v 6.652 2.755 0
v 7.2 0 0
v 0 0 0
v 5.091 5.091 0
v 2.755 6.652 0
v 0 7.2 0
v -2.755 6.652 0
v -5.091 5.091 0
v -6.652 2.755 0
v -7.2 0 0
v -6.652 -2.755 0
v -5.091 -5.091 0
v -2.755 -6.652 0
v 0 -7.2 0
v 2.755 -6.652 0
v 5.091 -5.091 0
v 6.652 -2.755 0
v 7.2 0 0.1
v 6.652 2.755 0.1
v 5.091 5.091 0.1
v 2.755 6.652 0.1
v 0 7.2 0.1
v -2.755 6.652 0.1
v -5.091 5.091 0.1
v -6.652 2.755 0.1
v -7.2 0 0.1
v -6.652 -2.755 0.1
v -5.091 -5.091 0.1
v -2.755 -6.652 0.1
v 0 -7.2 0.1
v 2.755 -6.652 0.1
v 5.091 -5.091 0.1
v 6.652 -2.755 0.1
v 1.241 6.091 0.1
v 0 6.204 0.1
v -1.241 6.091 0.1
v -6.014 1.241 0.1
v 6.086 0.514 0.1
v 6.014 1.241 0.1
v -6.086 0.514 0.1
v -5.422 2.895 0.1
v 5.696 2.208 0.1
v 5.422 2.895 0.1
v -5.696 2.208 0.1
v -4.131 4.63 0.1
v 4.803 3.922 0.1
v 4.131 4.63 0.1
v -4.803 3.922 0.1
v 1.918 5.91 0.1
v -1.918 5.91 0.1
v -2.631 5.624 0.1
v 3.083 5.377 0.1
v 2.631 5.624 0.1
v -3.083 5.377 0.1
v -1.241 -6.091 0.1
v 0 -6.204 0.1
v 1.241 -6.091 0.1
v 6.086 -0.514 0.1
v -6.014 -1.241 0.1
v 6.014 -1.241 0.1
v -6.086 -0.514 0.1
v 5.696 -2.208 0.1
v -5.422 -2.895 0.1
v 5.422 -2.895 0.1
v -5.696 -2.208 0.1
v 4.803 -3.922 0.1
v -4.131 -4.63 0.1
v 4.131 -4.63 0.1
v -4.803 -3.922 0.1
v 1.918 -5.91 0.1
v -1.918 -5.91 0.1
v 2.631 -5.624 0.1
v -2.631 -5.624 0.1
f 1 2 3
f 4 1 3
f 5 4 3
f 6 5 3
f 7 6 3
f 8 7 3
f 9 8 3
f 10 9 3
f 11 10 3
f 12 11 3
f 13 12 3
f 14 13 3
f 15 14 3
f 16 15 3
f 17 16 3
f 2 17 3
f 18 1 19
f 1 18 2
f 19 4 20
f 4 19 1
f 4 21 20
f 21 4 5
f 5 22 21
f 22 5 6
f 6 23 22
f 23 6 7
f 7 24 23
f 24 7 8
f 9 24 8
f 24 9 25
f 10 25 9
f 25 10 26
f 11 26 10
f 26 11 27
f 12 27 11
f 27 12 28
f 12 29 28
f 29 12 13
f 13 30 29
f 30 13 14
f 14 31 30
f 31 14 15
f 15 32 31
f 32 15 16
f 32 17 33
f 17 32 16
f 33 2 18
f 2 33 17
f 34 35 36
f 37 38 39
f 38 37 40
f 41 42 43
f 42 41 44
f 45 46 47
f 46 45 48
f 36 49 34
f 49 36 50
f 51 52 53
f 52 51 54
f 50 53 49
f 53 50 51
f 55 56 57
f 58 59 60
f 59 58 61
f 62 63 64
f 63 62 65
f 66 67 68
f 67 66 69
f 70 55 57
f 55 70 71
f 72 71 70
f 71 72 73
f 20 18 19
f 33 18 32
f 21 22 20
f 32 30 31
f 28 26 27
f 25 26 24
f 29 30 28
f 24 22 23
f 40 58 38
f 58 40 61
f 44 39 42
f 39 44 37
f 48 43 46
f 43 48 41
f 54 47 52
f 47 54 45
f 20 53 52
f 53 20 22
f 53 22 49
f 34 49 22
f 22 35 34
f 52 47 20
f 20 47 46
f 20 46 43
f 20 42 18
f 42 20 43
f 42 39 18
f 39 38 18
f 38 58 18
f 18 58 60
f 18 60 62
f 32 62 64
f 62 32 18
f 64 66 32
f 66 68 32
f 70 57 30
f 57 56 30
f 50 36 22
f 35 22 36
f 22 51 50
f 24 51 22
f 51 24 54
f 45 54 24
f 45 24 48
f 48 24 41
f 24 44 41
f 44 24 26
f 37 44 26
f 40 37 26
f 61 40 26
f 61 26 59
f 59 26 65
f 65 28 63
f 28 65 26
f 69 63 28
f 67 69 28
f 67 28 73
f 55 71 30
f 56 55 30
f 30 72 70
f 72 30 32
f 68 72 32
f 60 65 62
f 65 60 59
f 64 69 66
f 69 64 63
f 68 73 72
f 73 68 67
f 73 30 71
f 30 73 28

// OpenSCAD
// file: ../p/4-4disc.scad
use <../lib.scad>
function ldraw_lib__4_4disc() = [
// 0 Disc 1.0
// 0 Name: 4-4disc.dat
// 0 Author: James Jessiman
// 0 !LDRAW_ORG Primitive UPDATE 2002-02
// 0 !LICENSE Licensed under CC BY 4.0 : see CAreadme.txt
// 
// 0 BFC CERTIFY CCW
  [0,"BFC","CERTIFY"],
  [0,"BFC","CCW"],
// 
// 0 !HISTORY 1998-12-15 [PTadmin] Official Update 1998-10
// 0 !HISTORY 2002-03-23 [sbliss] Added BFC statement
// 0 !HISTORY 2002-04-25 [PTadmin] Official Update 2002-02
// 0 !HISTORY 2007-06-24 [PTadmin] Header formatted for Contributor Agreement
// 0 !HISTORY 2008-07-01 [PTadmin] Official Update 2008-01
// 
// 
// 3 16 0 0 0 1 0 0 0.9239 0 0.3827
  [3,16,0,0,0,1,0,0,0.9239,0,0.3827],
// 3 16 0 0 0 0.9239 0 0.3827 0.7071 0 0.7071
  [3,16,0,0,0,0.9239,0,0.3827,0.7071,0,0.7071],
// 3 16 0 0 0 0.7071 0 0.7071 0.3827 0 0.9239
  [3,16,0,0,0,0.7071,0,0.7071,0.3827,0,0.9239],
// 3 16 0 0 0 0.3827 0 0.9239 0 0 1
  [3,16,0,0,0,0.3827,0,0.9239,0,0,1],
// 3 16 0 0 0 0 0 1 -0.3827 0 0.9239
  [3,16,0,0,0,0,0,1,-0.3827,0,0.9239],
// 3 16 0 0 0 -0.3827 0 0.9239 -0.7071 0 0.7071
  [3,16,0,0,0,-0.3827,0,0.9239,-0.7071,0,0.7071],
// 3 16 0 0 0 -0.7071 0 0.7071 -0.9239 0 0.3827
  [3,16,0,0,0,-0.7071,0,0.7071,-0.9239,0,0.3827],
// 3 16 0 0 0 -0.9239 0 0.3827 -1 0 -0
  [3,16,0,0,0,-0.9239,0,0.3827,-1,0,-0],
// 3 16 0 0 0 -1 0 -0 -0.9239 0 -0.3827
  [3,16,0,0,0,-1,0,-0,-0.9239,0,-0.3827],
// 3 16 0 0 0 -0.9239 0 -0.3827 -0.7071 0 -0.7071
  [3,16,0,0,0,-0.9239,0,-0.3827,-0.7071,0,-0.7071],
// 3 16 0 0 0 -0.7071 0 -0.7071 -0.3827 0 -0.9239
  [3,16,0,0,0,-0.7071,0,-0.7071,-0.3827,0,-0.9239],
// 3 16 0 0 0 -0.3827 0 -0.9239 0 0 -1
  [3,16,0,0,0,-0.3827,0,-0.9239,0,0,-1],
// 3 16 0 0 0 0 0 -1 0.3827 0 -0.9239
  [3,16,0,0,0,0,0,-1,0.3827,0,-0.9239],
// 3 16 0 0 0 0.3827 0 -0.9239 0.7071 0 -0.7071
  [3,16,0,0,0,0.3827,0,-0.9239,0.7071,0,-0.7071],
// 3 16 0 0 0 0.7071 0 -0.7071 0.9239 0 -0.3827
  [3,16,0,0,0,0.7071,0,-0.7071,0.9239,0,-0.3827],
// 3 16 0 0 0 0.9239 0 -0.3827 1 0 0
  [3,16,0,0,0,0.9239,0,-0.3827,1,0,0],
// 0
];
module ldraw_lib__4_4disc(step=0, col=false, unit=2/5, alt=false, line=0.2, solid=!$preview)
    makepoly(ldraw_lib__4_4disc(), step=step, col=col, unit=unit, alt=alt, line=line, solid=solid);
ldraw_lib__4_4disc(line=0.2);
// file: ../p/4-4cyli.scad
use <../lib.scad>
function ldraw_lib__4_4cyli() = [
// 0 Cylinder 1.0
// 0 Name: 4-4cyli.dat
// 0 Author: James Jessiman
// 0 !LDRAW_ORG Primitive UPDATE 2005-01
// 0 !LICENSE Licensed under CC BY 2.0 and CC BY 4.0 : see CAreadme.txt
// 
// 0 BFC CERTIFY CCW
  [0,"BFC","CERTIFY"],
  [0,"BFC","CCW"],
// 
// 0 !HISTORY 1998-12-15 [PTadmin] Official Update 1998-10
// 0 !HISTORY 2002-03-23 [sbliss] Added BFC statement; merged headers from files in distributions LDraw 0.27 and Complete.
// 0 !HISTORY 2002-04-25 [PTadmin] Official Update 2002-02
// 0 !HISTORY 2004-12-14 [guyvivan] BFC CCW
// 0 !HISTORY 2005-12-28 [PTadmin] Official Update 2005-01
// 0 !HISTORY 2007-06-24 [PTadmin] Header formatted for Contributor Agreement
// 0 !HISTORY 2008-07-01 [PTadmin] Official Update 2008-01
// 
// 
// 4 16 1 1 0 0.9239 1 0.3827 0.9239 0 0.3827 1 0 0
  [4,16,1,1,0,0.9239,1,0.3827,0.9239,0,0.3827,1,0,0],
// 5 24 1 0 0 1 1 0 0.9239 0 0.3827 0.9239 0 -0.3827
  [5,24,1,0,0,1,1,0,0.9239,0,0.3827,0.9239,0,-0.3827],
// 4 16 0.9239 1 0.3827 0.7071 1 0.7071 0.7071 0 0.7071 0.9239 0 0.3827
  [4,16,0.9239,1,0.3827,0.7071,1,0.7071,0.7071,0,0.7071,0.9239,0,0.3827],
// 5 24 0.9239 0 0.3827 0.9239 1 0.3827 0.7071 0 0.7071 1 0 0
  [5,24,0.9239,0,0.3827,0.9239,1,0.3827,0.7071,0,0.7071,1,0,0],
// 4 16 0.7071 1 0.7071 0.3827 1 0.9239 0.3827 0 0.9239 0.7071 0 0.7071
  [4,16,0.7071,1,0.7071,0.3827,1,0.9239,0.3827,0,0.9239,0.7071,0,0.7071],
// 5 24 0.7071 0 0.7071 0.7071 1 0.7071 0.3827 0 0.9239 0.9239 0 0.3827
  [5,24,0.7071,0,0.7071,0.7071,1,0.7071,0.3827,0,0.9239,0.9239,0,0.3827],
// 4 16 0.3827 1 0.9239 0 1 1 0 0 1 0.3827 0 0.9239
  [4,16,0.3827,1,0.9239,0,1,1,0,0,1,0.3827,0,0.9239],
// 5 24 0.3827 0 0.9239 0.3827 1 0.9239 0 0 1 0.7071 0 0.7071
  [5,24,0.3827,0,0.9239,0.3827,1,0.9239,0,0,1,0.7071,0,0.7071],
// 4 16 0 1 1 -0.3827 1 0.9239 -0.3827 0 0.9239 0 0 1
  [4,16,0,1,1,-0.3827,1,0.9239,-0.3827,0,0.9239,0,0,1],
// 5 24 0 0 1 0 1 1 -0.3827 0 0.9239 0.3827 0 0.9239
  [5,24,0,0,1,0,1,1,-0.3827,0,0.9239,0.3827,0,0.9239],
// 4 16 -0.3827 1 0.9239 -0.7071 1 0.7071 -0.7071 0 0.7071 -0.3827 0 0.9239
  [4,16,-0.3827,1,0.9239,-0.7071,1,0.7071,-0.7071,0,0.7071,-0.3827,0,0.9239],
// 5 24 -0.3827 0 0.9239 -0.3827 1 0.9239 -0.7071 0 0.7071 0 0 1
  [5,24,-0.3827,0,0.9239,-0.3827,1,0.9239,-0.7071,0,0.7071,0,0,1],
// 4 16 -0.7071 1 0.7071 -0.9239 1 0.3827 -0.9239 0 0.3827 -0.7071 0 0.7071
  [4,16,-0.7071,1,0.7071,-0.9239,1,0.3827,-0.9239,0,0.3827,-0.7071,0,0.7071],
// 5 24 -0.7071 0 0.7071 -0.7071 1 0.7071 -0.9239 0 0.3827 -0.3827 0 0.9239
  [5,24,-0.7071,0,0.7071,-0.7071,1,0.7071,-0.9239,0,0.3827,-0.3827,0,0.9239],
// 4 16 -0.9239 1 0.3827 -1 1 0 -1 0 0 -0.9239 0 0.3827
  [4,16,-0.9239,1,0.3827,-1,1,0,-1,0,0,-0.9239,0,0.3827],
// 5 24 -0.9239 0 0.3827 -0.9239 1 0.3827 -1 0 0 -0.7071 0 0.7071
  [5,24,-0.9239,0,0.3827,-0.9239,1,0.3827,-1,0,0,-0.7071,0,0.7071],
// 4 16 -1 1 0 -0.9239 1 -0.3827 -0.9239 0 -0.3827 -1 0 0
  [4,16,-1,1,0,-0.9239,1,-0.3827,-0.9239,0,-0.3827,-1,0,0],
// 5 24 -1 0 0 -1 1 0 -0.9239 0 -0.3827 -0.9239 0 0.3827
  [5,24,-1,0,0,-1,1,0,-0.9239,0,-0.3827,-0.9239,0,0.3827],
// 4 16 -0.9239 1 -0.3827 -0.7071 1 -0.7071 -0.7071 0 -0.7071 -0.9239 0 -0.3827
  [4,16,-0.9239,1,-0.3827,-0.7071,1,-0.7071,-0.7071,0,-0.7071,-0.9239,0,-0.3827],
// 5 24 -0.9239 0 -0.3827 -0.9239 1 -0.3827 -0.7071 0 -0.7071 -1 0 0
  [5,24,-0.9239,0,-0.3827,-0.9239,1,-0.3827,-0.7071,0,-0.7071,-1,0,0],
// 4 16 -0.7071 1 -0.7071 -0.3827 1 -0.9239 -0.3827 0 -0.9239 -0.7071 0 -0.7071
  [4,16,-0.7071,1,-0.7071,-0.3827,1,-0.9239,-0.3827,0,-0.9239,-0.7071,0,-0.7071],
// 5 24 -0.7071 0 -0.7071 -0.7071 1 -0.7071 -0.3827 0 -0.9239 -0.9239 0 -0.3827
  [5,24,-0.7071,0,-0.7071,-0.7071,1,-0.7071,-0.3827,0,-0.9239,-0.9239,0,-0.3827],
// 4 16 -0.3827 1 -0.9239 0 1 -1 0 0 -1 -0.3827 0 -0.9239
  [4,16,-0.3827,1,-0.9239,0,1,-1,0,0,-1,-0.3827,0,-0.9239],
// 5 24 -0.3827 0 -0.9239 -0.3827 1 -0.9239 0 0 -1 -0.7071 0 -0.7071
  [5,24,-0.3827,0,-0.9239,-0.3827,1,-0.9239,0,0,-1,-0.7071,0,-0.7071],
// 4 16 0 1 -1 0.3827 1 -0.9239 0.3827 0 -0.9239 0 0 -1
  [4,16,0,1,-1,0.3827,1,-0.9239,0.3827,0,-0.9239,0,0,-1],
// 5 24 0 0 -1 0 1 -1 0.3827 0 -0.9239 -0.3827 0 -0.9239
  [5,24,0,0,-1,0,1,-1,0.3827,0,-0.9239,-0.3827,0,-0.9239],
// 4 16 0.3827 1 -0.9239 0.7071 1 -0.7071 0.7071 0 -0.7071 0.3827 0 -0.9239
  [4,16,0.3827,1,-0.9239,0.7071,1,-0.7071,0.7071,0,-0.7071,0.3827,0,-0.9239],
// 5 24 0.3827 0 -0.9239 0.3827 1 -0.9239 0.7071 0 -0.7071 0 0 -1
  [5,24,0.3827,0,-0.9239,0.3827,1,-0.9239,0.7071,0,-0.7071,0,0,-1],
// 4 16 0.7071 1 -0.7071 0.9239 1 -0.3827 0.9239 0 -0.3827 0.7071 0 -0.7071
  [4,16,0.7071,1,-0.7071,0.9239,1,-0.3827,0.9239,0,-0.3827,0.7071,0,-0.7071],
// 5 24 0.7071 0 -0.7071 0.7071 1 -0.7071 0.9239 0 -0.3827 0.3827 0 -0.9239
  [5,24,0.7071,0,-0.7071,0.7071,1,-0.7071,0.9239,0,-0.3827,0.3827,0,-0.9239],
// 4 16 0.9239 1 -0.3827 1 1 0 1 0 0 0.9239 0 -0.3827
  [4,16,0.9239,1,-0.3827,1,1,0,1,0,0,0.9239,0,-0.3827],
// 5 24 0.9239 0 -0.3827 0.9239 1 -0.3827 1 0 0 0.7071 0 -0.7071
  [5,24,0.9239,0,-0.3827,0.9239,1,-0.3827,1,0,0,0.7071,0,-0.7071],
// 0
];
module ldraw_lib__4_4cyli(step=0, col=false, unit=2/5, alt=false, line=0.2, solid=!$preview)
    makepoly(ldraw_lib__4_4cyli(), step=step, col=col, unit=unit, alt=alt, line=line, solid=solid);
ldraw_lib__4_4cyli(line=0.2);
// file: ../p/4-4cylc3.scad
use <../lib.scad>
use <4-4cyli.scad>
use <4-4disc.scad>
function ldraw_lib__4_4cylc3() = [
// 0 Cylinder Closed 1.0 without Top or Bottom Edge Lines
// 0 Name: 4-4cylc3.dat
// 0 Author: Chris Dee [cwdee]
// 0 !LDRAW_ORG Primitive UPDATE 2017-01
// 0 !LICENSE Licensed under CC BY 4.0 : see CAreadme.txt
// 
// 0 BFC CERTIFY CCW
  [0,"BFC","CERTIFY"],
  [0,"BFC","CCW"],
// 
// 0 !HISTORY 2017-12-30 [PTadmin] Official Update 2017-01
// 
// 
// 1 16 0 0 0 1 0 0 0 1 0 0 0 1 4-4disc.dat
  [1,16,0,0,0,1,0,0,0,1,0,0,0,1, ldraw_lib__4_4disc()],
// 1 16 0 0 0 1 0 0 0 1 0 0 0 1 4-4cyli.dat
  [1,16,0,0,0,1,0,0,0,1,0,0,0,1, ldraw_lib__4_4cyli()],
// 0
];
module ldraw_lib__4_4cylc3(step=0, col=false, unit=2/5, alt=false, line=0.2, solid=!$preview)
    makepoly(ldraw_lib__4_4cylc3(), step=step, col=col, unit=unit, alt=alt, line=line, solid=solid);
ldraw_lib__4_4cylc3(line=0.2);
// file: ../p/1-8chrd.scad
use <../lib.scad>
function ldraw_lib__1_8chrd() = [
// 0 Chord 0.125
// 0 Name: 1-8chrd.dat
// 0 Author: Andy Westrate [westrate]
// 0 !LDRAW_ORG Primitive UPDATE 2004-02
// 0 !LICENSE Licensed under CC BY 2.0 and CC BY 4.0 : see CAreadme.txt
// 
// 0 BFC CERTIFY CCW
  [0,"BFC","CERTIFY"],
  [0,"BFC","CCW"],
// 
// 0 !HISTORY 2004-04-22 [PTadmin] Official Update 2004-02
// 0 !HISTORY 2007-06-22 [PTadmin] Header formatted for Contributor Agreement
// 0 !HISTORY 2008-07-01 [PTadmin] Official Update 2008-01
// 
// 
// 3 16 0.7071 0 0.7071 1 0 0 0.9239 0 0.3827
  [3,16,0.7071,0,0.7071,1,0,0,0.9239,0,0.3827],
// 
// 0
];
module ldraw_lib__1_8chrd(step=0, col=false, unit=2/5, alt=false, line=0.2, solid=!$preview)
    makepoly(ldraw_lib__1_8chrd(), step=step, col=col, unit=unit, alt=alt, line=line, solid=solid);
ldraw_lib__1_8chrd(line=0.2);
// main file
use <../lib.scad>
use <../p/1-8chrd.scad>
use <../p/4-4cylc3.scad>
function ldraw_lib__4111899c() = [
// 0 Sticker  1.8 x  1.8 Round with Black Stripes on Light Grey Background
// 0 Name: 4111899c.dat
// 0 Author: Ulrich Röder [UR]
// 0 !LDRAW_ORG Part UPDATE 2020-03
// 0 !LICENSE Licensed under CC BY 4.0 : see CAreadme.txt
// 
// 0 BFC CERTIFY CCW
  [0,"BFC","CERTIFY"],
  [0,"BFC","CCW"],
// 
// 0 !KEYWORDS Black Thunder, helicopter, Set 5542
// 
// 0 !HISTORY 2020-12-29 [PTadmin] Official Update 2020-03
// 
// 
// 1 16 0 0 0 18 0 0 0 -.25 0 0 0 18 4-4cylc3.dat
  [1,16,0,0,0,18,0,0,0,-.25,0,0,0,18, ldraw_lib__4_4cylc3()],
// 
// 3 0 3.102 -.25 15.228 0 -.25 15.51 -3.102 -.25 15.228
  [3,0,3.102,-.25,15.228,0,-.25,15.51,-3.102,-.25,15.228],
// 4 0 15.034 -.25 3.102 -15.034 -.25 3.102 -15.216 -.25 1.284 15.216 -.25 1.284
  [4,0,15.034,-.25,3.102,-15.034,-.25,3.102,-15.216,-.25,1.284,15.216,-.25,1.284],
// 4 0 13.554 -.25 7.238 -13.554 -.25 7.238 -14.24 -.25 5.52 14.24 -.25 5.52
  [4,0,13.554,-.25,7.238,-13.554,-.25,7.238,-14.24,-.25,5.52,14.24,-.25,5.52],
// 4 0 10.328 -.25 11.574 -10.328 -.25 11.574 -12.008 -.25 9.806 12.008 -.25 9.806
  [4,0,10.328,-.25,11.574,-10.328,-.25,11.574,-12.008,-.25,9.806,12.008,-.25,9.806],
// 4 0 3.102 -.25 15.228 -3.102 -.25 15.228 -4.796 -.25 14.776 4.796 -.25 14.776
  [4,0,3.102,-.25,15.228,-3.102,-.25,15.228,-4.796,-.25,14.776,4.796,-.25,14.776],
// 4 0 7.708 -.25 13.442 6.577 -.25 14.059 -6.577 -.25 14.059 -7.708 -.25 13.442
  [4,0,7.708,-.25,13.442,6.577,-.25,14.059,-6.577,-.25,14.059,-7.708,-.25,13.442],
// 4 0 -6.577 -.25 14.059 6.577 -.25 14.059 4.796 -.25 14.776 -4.796 -.25 14.776
  [4,0,-6.577,-.25,14.059,6.577,-.25,14.059,4.796,-.25,14.776,-4.796,-.25,14.776],
// 3 0 -3.102 -.25 -15.228 0 -.25 -15.51 3.102 -.25 -15.228
  [3,0,-3.102,-.25,-15.228,0,-.25,-15.51,3.102,-.25,-15.228],
// 4 0 -15.034 -.25 -3.102 15.034 -.25 -3.102 15.216 -.25 -1.284 -15.216 -.25 -1.284
  [4,0,-15.034,-.25,-3.102,15.034,-.25,-3.102,15.216,-.25,-1.284,-15.216,-.25,-1.284],
// 4 0 -13.554 -.25 -7.238 13.554 -.25 -7.238 14.24 -.25 -5.52 -14.24 -.25 -5.52
  [4,0,-13.554,-.25,-7.238,13.554,-.25,-7.238,14.24,-.25,-5.52,-14.24,-.25,-5.52],
// 4 0 -10.328 -.25 -11.574 10.328 -.25 -11.574 12.008 -.25 -9.806 -12.008 -.25 -9.806
  [4,0,-10.328,-.25,-11.574,10.328,-.25,-11.574,12.008,-.25,-9.806,-12.008,-.25,-9.806],
// 4 0 -3.102 -.25 -15.228 3.102 -.25 -15.228 4.796 -.25 -14.776 -4.796 -.25 -14.776
  [4,0,-3.102,-.25,-15.228,3.102,-.25,-15.228,4.796,-.25,-14.776,-4.796,-.25,-14.776],
// 4 0 6.577 -.25 -14.059 -6.577 -.25 -14.059 -4.796 -.25 -14.776 4.796 -.25 -14.776
  [4,0,6.577,-.25,-14.059,-6.577,-.25,-14.059,-4.796,-.25,-14.776,4.796,-.25,-14.776],
// 
// 1 7 0 -.25 0 18 0 0 0 1 0 0 0 18 1-8chrd.dat
  [1,7,0,-.25,0,18,0,0,0,1,0,0,0,18, ldraw_lib__1_8chrd()],
// 1 7 0 -.25 0 18 0 0 0 1 0 0 0 -18 1-8chrd.dat
  [1,7,0,-.25,0,18,0,0,0,1,0,0,0,-18, ldraw_lib__1_8chrd()],
// 1 7 0 -.25 0 0 0 18 0 1 0 18 0 0 1-8chrd.dat
  [1,7,0,-.25,0,0,0,18,0,1,0,18,0,0, ldraw_lib__1_8chrd()],
// 1 7 0 -.25 0 0 0 18 0 1 0 -18 0 0 1-8chrd.dat
  [1,7,0,-.25,0,0,0,18,0,1,0,-18,0,0, ldraw_lib__1_8chrd()],
// 1 7 0 -.25 0 -18 0 0 0 1 0 0 0 -18 1-8chrd.dat
  [1,7,0,-.25,0,-18,0,0,0,1,0,0,0,-18, ldraw_lib__1_8chrd()],
// 1 7 0 -.25 0 -18 0 0 0 1 0 0 0 18 1-8chrd.dat
  [1,7,0,-.25,0,-18,0,0,0,1,0,0,0,18, ldraw_lib__1_8chrd()],
// 1 7 0 -.25 0 0 0 -18 0 1 0 -18 0 0 1-8chrd.dat
  [1,7,0,-.25,0,0,0,-18,0,1,0,-18,0,0, ldraw_lib__1_8chrd()],
// 1 7 0 -.25 0 0 0 -18 0 1 0 18 0 0 1-8chrd.dat
  [1,7,0,-.25,0,0,0,-18,0,1,0,18,0,0, ldraw_lib__1_8chrd()],
// 4 7 15.216 -.25 1.284 -15.216 -.25 1.284 -15.216 -.25 -1.284 15.216 -.25 -1.284
  [4,7,15.216,-.25,1.284,-15.216,-.25,1.284,-15.216,-.25,-1.284,15.216,-.25,-1.284],
// 4 7 14.24 -.25 5.52 -14.24 -.25 5.52 -15.034 -.25 3.102 15.034 -.25 3.102
  [4,7,14.24,-.25,5.52,-14.24,-.25,5.52,-15.034,-.25,3.102,15.034,-.25,3.102],
// 4 7 12.008 -.25 9.806 -12.008 -.25 9.806 -13.554 -.25 7.238 13.554 -.25 7.238
  [4,7,12.008,-.25,9.806,-12.008,-.25,9.806,-13.554,-.25,7.238,13.554,-.25,7.238],
// 4 7 7.708 -.25 13.442 -7.708 -.25 13.442 -10.328 -.25 11.574 10.328 -.25 11.574
  [4,7,7.708,-.25,13.442,-7.708,-.25,13.442,-10.328,-.25,11.574,10.328,-.25,11.574],
// 4 7 6.577 -.25 14.059 7.708 -.25 13.442 12.7278 -.25 12.7278 0 -.25 18
  [4,7,6.577,-.25,14.059,7.708,-.25,13.442,12.7278,-.25,12.7278,0,-.25,18],
// 3 7 6.577 -.25 14.059 0 -.25 18 4.796 -.25 14.776
  [3,7,6.577,-.25,14.059,0,-.25,18,4.796,-.25,14.776],
// 3 7 3.102 -.25 15.228 4.796 -.25 14.776 0 -.25 18
  [3,7,3.102,-.25,15.228,4.796,-.25,14.776,0,-.25,18],
// 3 7 0 -.25 18 0 -.25 15.51 3.102 -.25 15.228
  [3,7,0,-.25,18,0,-.25,15.51,3.102,-.25,15.228],
// 3 7 7.708 -.25 13.442 10.328 -.25 11.574 12.7278 -.25 12.7278
  [3,7,7.708,-.25,13.442,10.328,-.25,11.574,12.7278,-.25,12.7278],
// 3 7 12.7278 -.25 12.7278 10.328 -.25 11.574 12.008 -.25 9.806
  [3,7,12.7278,-.25,12.7278,10.328,-.25,11.574,12.008,-.25,9.806],
// 3 7 12.7278 -.25 12.7278 12.008 -.25 9.806 13.554 -.25 7.238
  [3,7,12.7278,-.25,12.7278,12.008,-.25,9.806,13.554,-.25,7.238],
// 4 7 12.7278 -.25 12.7278 13.554 -.25 7.238 14.24 -.25 5.52 18 -.25 0
  [4,7,12.7278,-.25,12.7278,13.554,-.25,7.238,14.24,-.25,5.52,18,-.25,0],
// 3 7 14.24 -.25 5.52 15.034 -.25 3.102 18 -.25 0
  [3,7,14.24,-.25,5.52,15.034,-.25,3.102,18,-.25,0],
// 3 7 15.034 -.25 3.102 15.216 -.25 1.284 18 -.25 0
  [3,7,15.034,-.25,3.102,15.216,-.25,1.284,18,-.25,0],
// 3 7 15.216 -.25 1.284 15.216 -.25 -1.284 18 -.25 0
  [3,7,15.216,-.25,1.284,15.216,-.25,-1.284,18,-.25,0],
// 3 7 18 -.25 0 15.216 -.25 -1.284 15.034 -.25 -3.102
  [3,7,18,-.25,0,15.216,-.25,-1.284,15.034,-.25,-3.102],
// 3 7 18 -.25 0 15.034 -.25 -3.102 14.24 -.25 -5.52
  [3,7,18,-.25,0,15.034,-.25,-3.102,14.24,-.25,-5.52],
// 4 7 18 -.25 0 14.24 -.25 -5.52 13.554 -.25 -7.238 12.7278 -.25 -12.7278
  [4,7,18,-.25,0,14.24,-.25,-5.52,13.554,-.25,-7.238,12.7278,-.25,-12.7278],
// 3 7 13.554 -.25 -7.238 12.008 -.25 -9.806 12.7278 -.25 -12.7278
  [3,7,13.554,-.25,-7.238,12.008,-.25,-9.806,12.7278,-.25,-12.7278],
// 3 7 12.008 -.25 -9.806 10.328 -.25 -11.574 12.7278 -.25 -12.7278
  [3,7,12.008,-.25,-9.806,10.328,-.25,-11.574,12.7278,-.25,-12.7278],
// 3 7 4.796 -.25 -14.776 3.102 -.25 -15.228 0 -.25 -18
  [3,7,4.796,-.25,-14.776,3.102,-.25,-15.228,0,-.25,-18],
// 3 7 3.102 -.25 -15.228 0 -.25 -15.51 0 -.25 -18
  [3,7,3.102,-.25,-15.228,0,-.25,-15.51,0,-.25,-18],
// 3 7 -4.796 -.25 14.776 -3.102 -.25 15.228 0 -.25 18
  [3,7,-4.796,-.25,14.776,-3.102,-.25,15.228,0,-.25,18],
// 3 7 0 -.25 15.51 0 -.25 18 -3.102 -.25 15.228
  [3,7,0,-.25,15.51,0,-.25,18,-3.102,-.25,15.228],
// 3 7 0 -.25 18 -6.577 -.25 14.059 -4.796 -.25 14.776
  [3,7,0,-.25,18,-6.577,-.25,14.059,-4.796,-.25,14.776],
// 4 7 -12.7278 -.25 12.7278 -7.708 -.25 13.442 -6.577 -.25 14.059 0 -.25 18
  [4,7,-12.7278,-.25,12.7278,-7.708,-.25,13.442,-6.577,-.25,14.059,0,-.25,18],
// 3 7 -10.328 -.25 11.574 -7.708 -.25 13.442 -12.7278 -.25 12.7278
  [3,7,-10.328,-.25,11.574,-7.708,-.25,13.442,-12.7278,-.25,12.7278],
// 3 7 -10.328 -.25 11.574 -12.7278 -.25 12.7278 -12.008 -.25 9.806
  [3,7,-10.328,-.25,11.574,-12.7278,-.25,12.7278,-12.008,-.25,9.806],
// 3 7 -12.008 -.25 9.806 -12.7278 -.25 12.7278 -13.554 -.25 7.238
  [3,7,-12.008,-.25,9.806,-12.7278,-.25,12.7278,-13.554,-.25,7.238],
// 4 7 -14.24 -.25 5.52 -13.554 -.25 7.238 -12.7278 -.25 12.7278 -18 -.25 0
  [4,7,-14.24,-.25,5.52,-13.554,-.25,7.238,-12.7278,-.25,12.7278,-18,-.25,0],
// 3 7 -15.034 -.25 3.102 -14.24 -.25 5.52 -18 -.25 0
  [3,7,-15.034,-.25,3.102,-14.24,-.25,5.52,-18,-.25,0],
// 3 7 -15.216 -.25 1.284 -15.034 -.25 3.102 -18 -.25 0
  [3,7,-15.216,-.25,1.284,-15.034,-.25,3.102,-18,-.25,0],
// 3 7 -15.216 -.25 -1.284 -15.216 -.25 1.284 -18 -.25 0
  [3,7,-15.216,-.25,-1.284,-15.216,-.25,1.284,-18,-.25,0],
// 3 7 -15.216 -.25 -1.284 -18 -.25 0 -15.034 -.25 -3.102
  [3,7,-15.216,-.25,-1.284,-18,-.25,0,-15.034,-.25,-3.102],
// 3 7 -15.034 -.25 -3.102 -18 -.25 0 -14.24 -.25 -5.52
  [3,7,-15.034,-.25,-3.102,-18,-.25,0,-14.24,-.25,-5.52],
// 4 7 -13.554 -.25 -7.238 -14.24 -.25 -5.52 -18 -.25 0 -12.7278 -.25 -12.7278
  [4,7,-13.554,-.25,-7.238,-14.24,-.25,-5.52,-18,-.25,0,-12.7278,-.25,-12.7278],
// 3 7 -12.008 -.25 -9.806 -13.554 -.25 -7.238 -12.7278 -.25 -12.7278
  [3,7,-12.008,-.25,-9.806,-13.554,-.25,-7.238,-12.7278,-.25,-12.7278],
// 3 7 -10.328 -.25 -11.574 -12.008 -.25 -9.806 -12.7278 -.25 -12.7278
  [3,7,-10.328,-.25,-11.574,-12.008,-.25,-9.806,-12.7278,-.25,-12.7278],
// 3 7 -10.328 -.25 -11.574 -12.7278 -.25 -12.7278 -6.577 -.25 -14.059
  [3,7,-10.328,-.25,-11.574,-12.7278,-.25,-12.7278,-6.577,-.25,-14.059],
// 3 7 -3.102 -.25 -15.228 -4.796 -.25 -14.776 0 -.25 -18
  [3,7,-3.102,-.25,-15.228,-4.796,-.25,-14.776,0,-.25,-18],
// 3 7 0 -.25 -15.51 -3.102 -.25 -15.228 0 -.25 -18
  [3,7,0,-.25,-15.51,-3.102,-.25,-15.228,0,-.25,-18],
// 4 7 12.7278 -.25 -12.7278 6.577 -.25 -14.059 4.796 -.25 -14.776 0 -.25 -18
  [4,7,12.7278,-.25,-12.7278,6.577,-.25,-14.059,4.796,-.25,-14.776,0,-.25,-18],
// 3 7 10.328 -.25 -11.574 6.577 -.25 -14.059 12.7278 -.25 -12.7278
  [3,7,10.328,-.25,-11.574,6.577,-.25,-14.059,12.7278,-.25,-12.7278],
// 4 7 -14.24 -.25 -5.52 14.24 -.25 -5.52 15.034 -.25 -3.102 -15.034 -.25 -3.102
  [4,7,-14.24,-.25,-5.52,14.24,-.25,-5.52,15.034,-.25,-3.102,-15.034,-.25,-3.102],
// 4 7 -12.008 -.25 -9.806 12.008 -.25 -9.806 13.554 -.25 -7.238 -13.554 -.25 -7.238
  [4,7,-12.008,-.25,-9.806,12.008,-.25,-9.806,13.554,-.25,-7.238,-13.554,-.25,-7.238],
// 4 7 -6.577 -.25 -14.059 6.577 -.25 -14.059 10.328 -.25 -11.574 -10.328 -.25 -11.574
  [4,7,-6.577,-.25,-14.059,6.577,-.25,-14.059,10.328,-.25,-11.574,-10.328,-.25,-11.574],
// 4 7 0 -.25 -18 -4.796 -.25 -14.776 -6.577 -.25 -14.059 -12.7278 -.25 -12.7278
  [4,7,0,-.25,-18,-4.796,-.25,-14.776,-6.577,-.25,-14.059,-12.7278,-.25,-12.7278],
];
module ldraw_lib__4111899c(step=0, col=false, unit=2/5, alt=false, line=0.2, solid=!$preview)
    makepoly(ldraw_lib__4111899c(), step=step, col=col, unit=unit, alt=alt, line=line, solid=solid);
ldraw_lib__4111899c(line=0.2);
